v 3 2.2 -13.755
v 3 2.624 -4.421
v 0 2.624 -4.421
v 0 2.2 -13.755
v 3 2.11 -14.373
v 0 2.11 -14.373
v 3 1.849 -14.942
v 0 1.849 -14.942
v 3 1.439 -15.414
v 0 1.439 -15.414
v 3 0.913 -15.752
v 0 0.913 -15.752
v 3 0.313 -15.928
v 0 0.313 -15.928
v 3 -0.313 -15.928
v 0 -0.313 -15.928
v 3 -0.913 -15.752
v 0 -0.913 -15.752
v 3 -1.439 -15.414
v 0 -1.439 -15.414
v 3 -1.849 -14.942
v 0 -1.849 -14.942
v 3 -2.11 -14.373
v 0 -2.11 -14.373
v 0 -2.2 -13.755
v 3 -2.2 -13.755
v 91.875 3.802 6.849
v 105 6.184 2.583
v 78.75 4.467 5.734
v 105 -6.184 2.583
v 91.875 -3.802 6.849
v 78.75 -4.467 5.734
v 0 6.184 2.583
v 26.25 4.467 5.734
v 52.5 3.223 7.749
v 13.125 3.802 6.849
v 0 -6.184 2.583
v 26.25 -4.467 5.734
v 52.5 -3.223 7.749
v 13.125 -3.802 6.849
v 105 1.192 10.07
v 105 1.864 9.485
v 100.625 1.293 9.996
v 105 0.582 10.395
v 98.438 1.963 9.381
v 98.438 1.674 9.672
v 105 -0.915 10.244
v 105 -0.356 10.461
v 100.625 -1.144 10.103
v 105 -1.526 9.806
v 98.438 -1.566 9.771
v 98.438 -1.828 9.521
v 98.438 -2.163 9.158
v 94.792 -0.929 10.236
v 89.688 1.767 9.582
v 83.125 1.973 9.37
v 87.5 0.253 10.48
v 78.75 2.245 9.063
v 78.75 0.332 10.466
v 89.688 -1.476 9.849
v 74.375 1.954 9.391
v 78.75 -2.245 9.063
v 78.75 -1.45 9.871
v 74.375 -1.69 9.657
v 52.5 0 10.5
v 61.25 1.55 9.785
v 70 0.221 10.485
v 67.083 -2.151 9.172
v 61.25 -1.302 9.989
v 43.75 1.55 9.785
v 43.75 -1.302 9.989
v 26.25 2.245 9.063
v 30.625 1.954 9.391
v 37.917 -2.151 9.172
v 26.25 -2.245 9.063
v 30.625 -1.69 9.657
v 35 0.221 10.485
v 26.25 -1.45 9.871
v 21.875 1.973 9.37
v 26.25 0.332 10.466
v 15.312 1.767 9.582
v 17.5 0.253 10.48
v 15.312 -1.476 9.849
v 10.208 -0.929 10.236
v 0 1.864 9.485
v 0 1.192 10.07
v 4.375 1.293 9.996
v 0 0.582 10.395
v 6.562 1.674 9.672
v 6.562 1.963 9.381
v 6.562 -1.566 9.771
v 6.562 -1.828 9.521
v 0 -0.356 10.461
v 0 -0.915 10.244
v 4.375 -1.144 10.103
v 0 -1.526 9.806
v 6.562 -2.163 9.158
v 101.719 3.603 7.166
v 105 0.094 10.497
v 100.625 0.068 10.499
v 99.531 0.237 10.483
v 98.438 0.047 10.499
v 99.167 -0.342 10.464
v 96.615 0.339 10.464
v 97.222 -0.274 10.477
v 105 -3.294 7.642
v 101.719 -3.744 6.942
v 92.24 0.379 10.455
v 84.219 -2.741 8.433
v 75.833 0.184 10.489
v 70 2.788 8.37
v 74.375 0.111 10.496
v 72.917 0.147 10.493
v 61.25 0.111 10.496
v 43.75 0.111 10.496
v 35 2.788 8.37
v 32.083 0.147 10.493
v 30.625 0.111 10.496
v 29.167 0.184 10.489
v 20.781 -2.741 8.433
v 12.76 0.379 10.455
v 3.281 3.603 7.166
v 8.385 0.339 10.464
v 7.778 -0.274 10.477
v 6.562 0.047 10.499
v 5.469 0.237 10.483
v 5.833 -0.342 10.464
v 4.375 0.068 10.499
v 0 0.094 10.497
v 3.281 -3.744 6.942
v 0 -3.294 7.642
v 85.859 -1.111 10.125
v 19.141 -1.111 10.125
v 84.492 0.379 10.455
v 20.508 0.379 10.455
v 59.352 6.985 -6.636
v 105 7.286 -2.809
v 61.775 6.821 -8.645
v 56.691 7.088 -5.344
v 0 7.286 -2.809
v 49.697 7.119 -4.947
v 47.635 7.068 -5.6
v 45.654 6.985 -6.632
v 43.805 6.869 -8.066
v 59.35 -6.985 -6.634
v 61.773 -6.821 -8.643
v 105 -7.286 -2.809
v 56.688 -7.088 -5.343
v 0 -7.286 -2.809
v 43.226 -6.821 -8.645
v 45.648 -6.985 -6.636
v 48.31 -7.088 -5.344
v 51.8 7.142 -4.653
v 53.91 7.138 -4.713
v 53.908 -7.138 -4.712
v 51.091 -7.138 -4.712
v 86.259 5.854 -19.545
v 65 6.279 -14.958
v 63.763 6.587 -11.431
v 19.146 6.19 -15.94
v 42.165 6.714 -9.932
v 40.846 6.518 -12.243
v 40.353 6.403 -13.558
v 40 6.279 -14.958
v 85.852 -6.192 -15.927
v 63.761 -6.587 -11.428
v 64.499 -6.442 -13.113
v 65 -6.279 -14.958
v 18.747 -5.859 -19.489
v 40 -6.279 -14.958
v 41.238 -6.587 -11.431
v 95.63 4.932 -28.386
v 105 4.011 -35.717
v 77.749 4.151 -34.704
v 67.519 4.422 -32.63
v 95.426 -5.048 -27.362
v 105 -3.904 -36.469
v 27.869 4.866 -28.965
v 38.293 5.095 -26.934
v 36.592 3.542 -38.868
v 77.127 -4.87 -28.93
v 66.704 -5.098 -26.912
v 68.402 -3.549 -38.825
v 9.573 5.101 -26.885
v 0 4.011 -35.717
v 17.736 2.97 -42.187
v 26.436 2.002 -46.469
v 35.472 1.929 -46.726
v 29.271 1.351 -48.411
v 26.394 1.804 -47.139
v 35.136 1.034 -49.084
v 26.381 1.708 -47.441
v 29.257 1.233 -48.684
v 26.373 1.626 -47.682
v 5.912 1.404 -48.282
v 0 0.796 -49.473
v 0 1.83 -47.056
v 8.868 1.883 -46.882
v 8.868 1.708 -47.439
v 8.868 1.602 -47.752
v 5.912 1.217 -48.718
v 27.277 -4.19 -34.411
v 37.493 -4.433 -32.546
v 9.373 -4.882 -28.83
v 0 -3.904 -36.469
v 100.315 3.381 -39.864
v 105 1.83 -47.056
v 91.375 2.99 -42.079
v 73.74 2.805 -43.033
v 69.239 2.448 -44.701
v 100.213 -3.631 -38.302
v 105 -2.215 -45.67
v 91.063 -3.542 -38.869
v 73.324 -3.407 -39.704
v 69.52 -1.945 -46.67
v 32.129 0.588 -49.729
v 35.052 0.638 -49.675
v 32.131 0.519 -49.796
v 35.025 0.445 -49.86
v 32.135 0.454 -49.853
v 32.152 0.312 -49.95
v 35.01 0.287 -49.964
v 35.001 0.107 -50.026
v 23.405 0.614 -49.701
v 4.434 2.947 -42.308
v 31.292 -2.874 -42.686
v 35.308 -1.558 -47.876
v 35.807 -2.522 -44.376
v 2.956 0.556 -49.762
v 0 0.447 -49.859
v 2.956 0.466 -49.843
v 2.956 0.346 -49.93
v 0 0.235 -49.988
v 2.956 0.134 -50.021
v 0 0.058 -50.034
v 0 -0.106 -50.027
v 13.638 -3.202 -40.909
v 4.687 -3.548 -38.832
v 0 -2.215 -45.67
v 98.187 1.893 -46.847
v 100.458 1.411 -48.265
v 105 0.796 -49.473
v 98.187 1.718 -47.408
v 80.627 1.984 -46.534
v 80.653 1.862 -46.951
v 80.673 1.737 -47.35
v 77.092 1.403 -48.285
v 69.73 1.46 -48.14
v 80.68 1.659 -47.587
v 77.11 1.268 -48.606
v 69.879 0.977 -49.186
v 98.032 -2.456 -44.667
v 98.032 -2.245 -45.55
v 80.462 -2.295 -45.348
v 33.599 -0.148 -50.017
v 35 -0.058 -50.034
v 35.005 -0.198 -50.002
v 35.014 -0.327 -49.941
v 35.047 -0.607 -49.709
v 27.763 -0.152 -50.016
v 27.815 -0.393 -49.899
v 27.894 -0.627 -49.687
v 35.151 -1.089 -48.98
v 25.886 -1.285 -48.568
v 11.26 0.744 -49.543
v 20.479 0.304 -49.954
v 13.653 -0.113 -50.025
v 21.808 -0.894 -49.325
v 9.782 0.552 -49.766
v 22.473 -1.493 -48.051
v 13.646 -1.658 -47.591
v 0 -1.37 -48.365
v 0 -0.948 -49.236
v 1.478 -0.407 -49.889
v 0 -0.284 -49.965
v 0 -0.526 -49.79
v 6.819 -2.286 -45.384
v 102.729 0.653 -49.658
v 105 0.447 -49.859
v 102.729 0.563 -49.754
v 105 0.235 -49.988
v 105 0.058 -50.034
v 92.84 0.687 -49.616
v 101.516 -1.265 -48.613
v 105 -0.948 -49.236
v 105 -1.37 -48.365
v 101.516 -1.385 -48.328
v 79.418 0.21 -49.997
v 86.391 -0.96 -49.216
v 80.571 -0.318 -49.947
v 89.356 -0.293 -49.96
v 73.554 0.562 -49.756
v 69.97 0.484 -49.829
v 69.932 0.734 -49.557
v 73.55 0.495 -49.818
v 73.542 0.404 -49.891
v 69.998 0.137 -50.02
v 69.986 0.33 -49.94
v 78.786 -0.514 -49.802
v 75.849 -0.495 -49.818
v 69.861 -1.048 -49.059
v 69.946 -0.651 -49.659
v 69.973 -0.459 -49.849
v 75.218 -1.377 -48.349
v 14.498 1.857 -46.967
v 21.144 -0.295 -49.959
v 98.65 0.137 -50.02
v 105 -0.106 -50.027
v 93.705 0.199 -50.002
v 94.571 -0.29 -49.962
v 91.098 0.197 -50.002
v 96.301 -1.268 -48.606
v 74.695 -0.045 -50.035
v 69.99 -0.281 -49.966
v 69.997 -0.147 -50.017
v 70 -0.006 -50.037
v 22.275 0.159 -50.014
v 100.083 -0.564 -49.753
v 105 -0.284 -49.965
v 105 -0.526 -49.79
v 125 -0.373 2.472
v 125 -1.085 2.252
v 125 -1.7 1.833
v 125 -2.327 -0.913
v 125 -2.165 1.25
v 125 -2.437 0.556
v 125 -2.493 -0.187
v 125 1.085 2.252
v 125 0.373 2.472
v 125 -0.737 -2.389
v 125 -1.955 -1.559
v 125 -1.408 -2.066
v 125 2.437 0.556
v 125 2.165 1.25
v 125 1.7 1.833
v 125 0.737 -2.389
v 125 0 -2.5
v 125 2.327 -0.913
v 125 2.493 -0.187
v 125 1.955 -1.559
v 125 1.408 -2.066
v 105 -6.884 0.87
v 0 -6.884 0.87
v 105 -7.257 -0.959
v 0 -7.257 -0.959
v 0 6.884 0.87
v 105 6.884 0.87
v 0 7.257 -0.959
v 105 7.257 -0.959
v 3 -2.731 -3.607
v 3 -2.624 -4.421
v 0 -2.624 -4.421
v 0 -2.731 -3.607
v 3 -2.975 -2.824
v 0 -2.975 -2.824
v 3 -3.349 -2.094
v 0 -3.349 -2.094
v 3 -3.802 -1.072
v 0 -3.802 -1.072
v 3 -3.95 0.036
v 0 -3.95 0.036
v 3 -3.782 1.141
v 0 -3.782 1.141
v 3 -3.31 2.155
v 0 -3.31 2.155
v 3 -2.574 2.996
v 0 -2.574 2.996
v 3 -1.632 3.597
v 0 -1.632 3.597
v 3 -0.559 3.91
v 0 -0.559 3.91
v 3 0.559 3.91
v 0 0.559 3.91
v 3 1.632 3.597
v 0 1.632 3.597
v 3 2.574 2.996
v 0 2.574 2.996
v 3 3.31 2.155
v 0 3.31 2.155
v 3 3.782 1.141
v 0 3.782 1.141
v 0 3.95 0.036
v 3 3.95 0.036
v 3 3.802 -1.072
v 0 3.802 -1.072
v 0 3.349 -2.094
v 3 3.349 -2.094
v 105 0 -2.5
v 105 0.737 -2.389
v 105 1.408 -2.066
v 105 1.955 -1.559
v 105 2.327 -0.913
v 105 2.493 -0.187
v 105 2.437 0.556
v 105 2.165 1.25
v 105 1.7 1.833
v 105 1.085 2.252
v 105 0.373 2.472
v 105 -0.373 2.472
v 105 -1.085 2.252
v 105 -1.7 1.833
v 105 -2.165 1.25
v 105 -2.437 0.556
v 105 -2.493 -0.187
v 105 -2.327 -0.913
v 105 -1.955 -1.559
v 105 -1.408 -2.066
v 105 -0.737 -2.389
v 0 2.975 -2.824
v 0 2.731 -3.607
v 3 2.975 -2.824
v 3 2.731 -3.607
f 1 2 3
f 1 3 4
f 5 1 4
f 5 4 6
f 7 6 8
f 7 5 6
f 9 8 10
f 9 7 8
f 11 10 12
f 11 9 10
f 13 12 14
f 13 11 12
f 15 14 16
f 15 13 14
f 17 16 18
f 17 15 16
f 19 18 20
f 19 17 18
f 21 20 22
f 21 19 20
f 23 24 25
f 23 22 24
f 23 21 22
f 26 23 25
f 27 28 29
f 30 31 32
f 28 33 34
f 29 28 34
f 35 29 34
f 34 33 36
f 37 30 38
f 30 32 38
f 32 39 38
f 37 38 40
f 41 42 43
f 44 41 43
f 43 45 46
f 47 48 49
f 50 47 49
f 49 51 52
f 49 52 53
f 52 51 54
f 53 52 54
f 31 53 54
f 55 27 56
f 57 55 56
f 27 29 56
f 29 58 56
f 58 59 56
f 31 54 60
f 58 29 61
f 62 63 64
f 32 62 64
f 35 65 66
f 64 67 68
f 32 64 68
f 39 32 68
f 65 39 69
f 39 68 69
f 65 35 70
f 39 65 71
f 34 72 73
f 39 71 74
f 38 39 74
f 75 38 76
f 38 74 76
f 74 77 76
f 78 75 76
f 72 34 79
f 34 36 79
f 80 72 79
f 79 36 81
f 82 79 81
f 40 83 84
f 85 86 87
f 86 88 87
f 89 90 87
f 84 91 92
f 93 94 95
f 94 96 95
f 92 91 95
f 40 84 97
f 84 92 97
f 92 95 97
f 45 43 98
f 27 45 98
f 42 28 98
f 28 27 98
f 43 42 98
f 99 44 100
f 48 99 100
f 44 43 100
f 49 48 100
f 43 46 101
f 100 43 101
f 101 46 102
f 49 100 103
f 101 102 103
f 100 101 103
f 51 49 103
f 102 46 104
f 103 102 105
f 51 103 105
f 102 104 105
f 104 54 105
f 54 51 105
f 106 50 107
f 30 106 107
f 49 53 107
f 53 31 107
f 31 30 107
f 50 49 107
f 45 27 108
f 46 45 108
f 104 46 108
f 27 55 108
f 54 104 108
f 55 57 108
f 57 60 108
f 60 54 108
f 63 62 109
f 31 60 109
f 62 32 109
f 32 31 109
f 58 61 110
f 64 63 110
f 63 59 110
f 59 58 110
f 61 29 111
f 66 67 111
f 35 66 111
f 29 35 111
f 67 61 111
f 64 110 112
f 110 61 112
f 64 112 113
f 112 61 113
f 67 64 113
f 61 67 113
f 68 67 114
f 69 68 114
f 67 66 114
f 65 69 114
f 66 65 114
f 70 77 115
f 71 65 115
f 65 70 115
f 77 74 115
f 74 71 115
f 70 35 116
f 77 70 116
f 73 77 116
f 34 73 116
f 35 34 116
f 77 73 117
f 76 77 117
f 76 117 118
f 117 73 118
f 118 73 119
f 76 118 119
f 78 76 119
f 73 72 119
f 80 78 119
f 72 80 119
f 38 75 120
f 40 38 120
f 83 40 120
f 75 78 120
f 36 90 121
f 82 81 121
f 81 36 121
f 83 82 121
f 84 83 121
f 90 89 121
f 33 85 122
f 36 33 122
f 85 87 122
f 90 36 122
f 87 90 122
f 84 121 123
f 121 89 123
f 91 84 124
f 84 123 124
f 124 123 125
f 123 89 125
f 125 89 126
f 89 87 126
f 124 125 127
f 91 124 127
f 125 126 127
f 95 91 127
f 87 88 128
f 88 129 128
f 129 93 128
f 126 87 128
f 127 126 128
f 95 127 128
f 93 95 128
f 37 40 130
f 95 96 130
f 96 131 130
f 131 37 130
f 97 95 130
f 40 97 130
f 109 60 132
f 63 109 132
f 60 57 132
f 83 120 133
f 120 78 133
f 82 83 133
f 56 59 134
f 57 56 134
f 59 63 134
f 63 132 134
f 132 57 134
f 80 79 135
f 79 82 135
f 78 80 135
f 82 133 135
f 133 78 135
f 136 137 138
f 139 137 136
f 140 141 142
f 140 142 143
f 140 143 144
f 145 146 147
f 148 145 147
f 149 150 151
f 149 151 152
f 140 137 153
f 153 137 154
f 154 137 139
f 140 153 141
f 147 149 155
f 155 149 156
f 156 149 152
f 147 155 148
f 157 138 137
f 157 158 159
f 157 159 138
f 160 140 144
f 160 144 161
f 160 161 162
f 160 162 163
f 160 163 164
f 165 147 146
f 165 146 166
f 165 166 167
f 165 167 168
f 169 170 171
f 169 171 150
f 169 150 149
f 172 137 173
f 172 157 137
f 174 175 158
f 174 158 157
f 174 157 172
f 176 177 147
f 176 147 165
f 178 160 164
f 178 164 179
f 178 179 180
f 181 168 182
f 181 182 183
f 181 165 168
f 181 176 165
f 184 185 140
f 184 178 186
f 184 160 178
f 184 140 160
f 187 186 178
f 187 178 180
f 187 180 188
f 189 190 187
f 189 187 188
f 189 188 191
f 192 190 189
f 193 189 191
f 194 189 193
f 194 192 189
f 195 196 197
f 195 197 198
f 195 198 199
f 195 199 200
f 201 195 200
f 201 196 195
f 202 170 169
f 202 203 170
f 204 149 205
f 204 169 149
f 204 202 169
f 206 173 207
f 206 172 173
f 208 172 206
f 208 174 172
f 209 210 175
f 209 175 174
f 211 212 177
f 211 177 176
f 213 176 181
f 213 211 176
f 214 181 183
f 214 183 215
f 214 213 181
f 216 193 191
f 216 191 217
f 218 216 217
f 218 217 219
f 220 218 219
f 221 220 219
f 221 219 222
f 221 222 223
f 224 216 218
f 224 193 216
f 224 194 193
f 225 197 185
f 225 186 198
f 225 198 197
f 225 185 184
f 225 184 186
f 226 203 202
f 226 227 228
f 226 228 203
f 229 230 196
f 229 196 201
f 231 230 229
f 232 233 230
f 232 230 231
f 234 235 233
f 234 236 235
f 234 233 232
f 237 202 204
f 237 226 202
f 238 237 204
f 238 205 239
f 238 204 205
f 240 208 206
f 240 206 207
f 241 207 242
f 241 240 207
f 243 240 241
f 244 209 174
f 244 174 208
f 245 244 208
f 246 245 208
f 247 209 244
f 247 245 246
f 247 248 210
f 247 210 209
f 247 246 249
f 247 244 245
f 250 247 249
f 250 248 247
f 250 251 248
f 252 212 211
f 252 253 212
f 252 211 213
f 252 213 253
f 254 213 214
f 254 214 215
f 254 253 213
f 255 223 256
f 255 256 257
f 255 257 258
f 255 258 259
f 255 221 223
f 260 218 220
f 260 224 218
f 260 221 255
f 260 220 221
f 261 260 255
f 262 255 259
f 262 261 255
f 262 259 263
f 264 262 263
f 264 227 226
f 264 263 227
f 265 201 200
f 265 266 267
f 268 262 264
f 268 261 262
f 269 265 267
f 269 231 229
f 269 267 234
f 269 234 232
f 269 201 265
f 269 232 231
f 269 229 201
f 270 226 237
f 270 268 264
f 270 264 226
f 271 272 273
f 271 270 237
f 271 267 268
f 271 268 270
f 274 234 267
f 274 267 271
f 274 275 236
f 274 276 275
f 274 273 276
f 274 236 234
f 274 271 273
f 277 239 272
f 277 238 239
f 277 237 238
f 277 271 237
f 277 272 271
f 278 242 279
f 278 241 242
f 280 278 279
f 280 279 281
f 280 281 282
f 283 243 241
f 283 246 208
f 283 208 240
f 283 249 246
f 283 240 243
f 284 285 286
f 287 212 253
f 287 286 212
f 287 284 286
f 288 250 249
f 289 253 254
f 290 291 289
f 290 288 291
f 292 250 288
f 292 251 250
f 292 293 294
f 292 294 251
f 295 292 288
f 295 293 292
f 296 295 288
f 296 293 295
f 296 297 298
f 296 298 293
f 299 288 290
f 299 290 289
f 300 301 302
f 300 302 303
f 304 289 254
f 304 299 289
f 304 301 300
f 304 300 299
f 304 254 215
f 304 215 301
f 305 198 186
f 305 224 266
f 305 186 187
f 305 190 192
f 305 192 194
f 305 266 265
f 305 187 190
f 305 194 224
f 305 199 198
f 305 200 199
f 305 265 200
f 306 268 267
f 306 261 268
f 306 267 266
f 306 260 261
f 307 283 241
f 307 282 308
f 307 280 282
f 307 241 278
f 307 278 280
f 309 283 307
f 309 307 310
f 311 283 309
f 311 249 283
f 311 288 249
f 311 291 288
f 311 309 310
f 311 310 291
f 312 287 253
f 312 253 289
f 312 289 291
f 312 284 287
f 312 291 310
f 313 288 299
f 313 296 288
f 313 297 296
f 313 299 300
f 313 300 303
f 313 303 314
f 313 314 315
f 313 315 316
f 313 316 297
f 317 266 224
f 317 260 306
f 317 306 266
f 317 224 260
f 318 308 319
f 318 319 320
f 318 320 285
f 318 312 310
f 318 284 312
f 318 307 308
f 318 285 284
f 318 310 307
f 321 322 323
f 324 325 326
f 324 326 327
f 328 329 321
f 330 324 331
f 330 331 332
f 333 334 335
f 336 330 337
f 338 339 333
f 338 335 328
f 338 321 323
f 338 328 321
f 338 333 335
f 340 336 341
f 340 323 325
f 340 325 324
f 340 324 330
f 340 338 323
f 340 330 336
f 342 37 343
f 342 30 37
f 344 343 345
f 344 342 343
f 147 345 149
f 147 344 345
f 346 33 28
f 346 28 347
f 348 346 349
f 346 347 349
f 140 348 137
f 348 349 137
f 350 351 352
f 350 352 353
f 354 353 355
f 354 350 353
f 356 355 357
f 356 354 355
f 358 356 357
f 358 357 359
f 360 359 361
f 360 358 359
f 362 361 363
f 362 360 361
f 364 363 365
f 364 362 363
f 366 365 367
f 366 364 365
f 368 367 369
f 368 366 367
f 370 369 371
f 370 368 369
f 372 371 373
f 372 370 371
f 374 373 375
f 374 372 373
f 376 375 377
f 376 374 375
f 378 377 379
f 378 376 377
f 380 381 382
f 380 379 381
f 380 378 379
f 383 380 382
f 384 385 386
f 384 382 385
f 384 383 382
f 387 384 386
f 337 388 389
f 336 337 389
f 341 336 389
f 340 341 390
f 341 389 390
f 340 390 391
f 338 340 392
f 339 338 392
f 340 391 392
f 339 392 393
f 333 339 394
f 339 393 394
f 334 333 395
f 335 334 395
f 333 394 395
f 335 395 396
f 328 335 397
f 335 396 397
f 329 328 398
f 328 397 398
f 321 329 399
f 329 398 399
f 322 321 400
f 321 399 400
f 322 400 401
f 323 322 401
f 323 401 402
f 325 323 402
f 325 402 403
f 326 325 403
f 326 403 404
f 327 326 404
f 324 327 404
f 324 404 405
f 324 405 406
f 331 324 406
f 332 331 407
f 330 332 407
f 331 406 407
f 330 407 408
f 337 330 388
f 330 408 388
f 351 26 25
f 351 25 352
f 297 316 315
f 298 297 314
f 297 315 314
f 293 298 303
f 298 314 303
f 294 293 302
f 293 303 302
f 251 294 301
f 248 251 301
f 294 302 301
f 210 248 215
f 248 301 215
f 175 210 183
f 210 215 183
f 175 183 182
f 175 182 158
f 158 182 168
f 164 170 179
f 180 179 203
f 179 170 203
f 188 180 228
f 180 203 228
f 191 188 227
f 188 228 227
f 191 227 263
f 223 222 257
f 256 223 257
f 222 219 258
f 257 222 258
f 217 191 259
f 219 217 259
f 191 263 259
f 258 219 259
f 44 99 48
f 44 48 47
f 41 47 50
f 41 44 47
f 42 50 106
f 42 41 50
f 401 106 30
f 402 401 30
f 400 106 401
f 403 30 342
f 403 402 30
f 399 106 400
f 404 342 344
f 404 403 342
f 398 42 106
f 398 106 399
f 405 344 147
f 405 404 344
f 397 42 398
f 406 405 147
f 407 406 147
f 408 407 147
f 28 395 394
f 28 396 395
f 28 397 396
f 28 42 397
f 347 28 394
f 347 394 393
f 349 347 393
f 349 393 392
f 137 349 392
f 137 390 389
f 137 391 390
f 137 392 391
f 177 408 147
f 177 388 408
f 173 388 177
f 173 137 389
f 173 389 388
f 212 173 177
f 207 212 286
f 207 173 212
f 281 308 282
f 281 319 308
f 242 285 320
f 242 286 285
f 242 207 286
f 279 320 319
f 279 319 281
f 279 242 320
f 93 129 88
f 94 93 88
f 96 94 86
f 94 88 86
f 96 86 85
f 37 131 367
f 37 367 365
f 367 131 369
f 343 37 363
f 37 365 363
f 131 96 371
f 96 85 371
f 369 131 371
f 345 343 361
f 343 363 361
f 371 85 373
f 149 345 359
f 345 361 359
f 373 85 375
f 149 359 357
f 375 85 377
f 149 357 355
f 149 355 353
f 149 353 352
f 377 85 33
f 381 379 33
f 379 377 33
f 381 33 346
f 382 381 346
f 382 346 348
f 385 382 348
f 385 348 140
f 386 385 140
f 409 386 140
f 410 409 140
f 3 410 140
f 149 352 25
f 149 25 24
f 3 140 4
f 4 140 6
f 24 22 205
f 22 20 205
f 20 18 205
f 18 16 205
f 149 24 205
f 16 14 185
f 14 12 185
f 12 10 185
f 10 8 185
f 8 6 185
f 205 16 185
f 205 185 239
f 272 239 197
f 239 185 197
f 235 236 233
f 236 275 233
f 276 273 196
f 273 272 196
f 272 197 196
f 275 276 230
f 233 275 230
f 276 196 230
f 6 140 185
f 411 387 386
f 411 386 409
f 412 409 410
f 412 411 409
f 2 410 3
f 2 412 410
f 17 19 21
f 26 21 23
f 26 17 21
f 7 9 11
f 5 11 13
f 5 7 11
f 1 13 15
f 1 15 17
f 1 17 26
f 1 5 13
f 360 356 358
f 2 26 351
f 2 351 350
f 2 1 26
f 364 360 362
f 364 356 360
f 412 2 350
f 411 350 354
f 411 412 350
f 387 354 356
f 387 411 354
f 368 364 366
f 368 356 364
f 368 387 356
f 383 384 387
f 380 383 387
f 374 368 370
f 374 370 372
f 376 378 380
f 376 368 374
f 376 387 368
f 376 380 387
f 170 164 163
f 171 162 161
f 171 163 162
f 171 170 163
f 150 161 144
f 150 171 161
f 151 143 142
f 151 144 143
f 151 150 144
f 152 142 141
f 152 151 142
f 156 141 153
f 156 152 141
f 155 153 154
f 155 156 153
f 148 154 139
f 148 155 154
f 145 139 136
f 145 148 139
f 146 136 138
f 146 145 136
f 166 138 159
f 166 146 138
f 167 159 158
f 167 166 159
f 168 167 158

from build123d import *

# Parameters (mm, degrees)
SKETCH1_R               = 1.5
BOSS_EXTRUDE1_DEPTH     = 105
FILLET1_R               = 10
CUT_EXTRUDE1_DEPTH      = 117.542660484
CUT_EXTRUDE1_DEPTH_BACK = 117.542660484
CAVITY1_DEPTH           = 3
SKETCH3_R               = 2.5
SKETCH3_R_2             = 1.5
BOSS_EXTRUDE2_DEPTH     = 20
BOSS_EXTRUDE3_REACH     = 134.065
SKETCH4_R               = 1.5
CUT_EXTRUDE2_DEPTH      = 135.841357497
CUT_EXTRUDE2_DEPTH_BACK = 135.841357497
FILLET2_R               = 5
CUT_EXTRUDE3_DEPTH      = 10


# Read off the part's stored shape, not the designer's step: Cavity1
with BuildPart() as part:
    # Sketch1 → Boss-Extrude1 (new body)
    with BuildSketch(Plane(origin=(0, 0, 0), x_dir=(0, 0, -1), z_dir=(1, 0, 0))):
        with BuildLine():
            add(Edge.make_bspline(
                [(3.73e-07, 7.5), (-15, 0), (-3.73e-07, -7.5)],
                knots=[0, 0, 0, 1, 1, 1], degree=2, weights=[1, 2.333333333, 1]))
            add(Edge.make_bspline(
                [(3.73e-07, 7.5), (100, 0), (-3.73e-07, -7.5)],
                knots=[0, 0, 0, 1, 1, 1], degree=2, weights=[1, 1.001467765, 1]))
        make_face()
        Circle(SKETCH1_R, mode=Mode.SUBTRACT)
    extrude(amount=BOSS_EXTRUDE1_DEPTH)

    # Fillet1
    fillet1_edges = [part.edges().sort_by_distance(p)[0] for p in [
        (52.5, -7.5, 3.73e-07),
        (52.5, 7.5, -3.73e-07),
    ]]
    fillet(fillet1_edges, radius=FILLET1_R)

    # Sketch2 → Cut-Extrude1 (cut, two sides: drawn at the far end of the back side and taken through both)
    with BuildSketch(Plane(origin=(0, 0, 0), x_dir=(1, 0, 0), z_dir=(0, 1, 0)).offset(-CUT_EXTRUDE1_DEPTH_BACK)):
        with BuildLine():
            Line((65, 19.76833361), (65, 24.578179161))
            ThreePointArc((65, 24.578179161), (52.5, 34.902500415), (40, 24.578179161))
            Line((40, 24.578179161), (40, 19.76833361))
            Line((40, 19.76833361), (40, 14.958488059))
            ThreePointArc((40, 14.958488059), (52.5, 4.634166805), (65, 14.958488059))
            Line((65, 14.958488059), (65, 19.76833361))
        make_face()
        with BuildLine():
            Line((65, 24.578179161), (65, 50.03666722))
            Line((65, 50.03666722), (40, 50.03666722))
            Line((40, 50.03666722), (40, 24.578179161))
            ThreePointArc((40, 24.578179161), (52.5, 34.902500415), (65, 24.578179161))
        make_face()
    extrude(amount=CUT_EXTRUDE1_DEPTH + CUT_EXTRUDE1_DEPTH_BACK, mode=Mode.SUBTRACT)

    # Cavity1 outline → Cavity1 (cut)
    with BuildSketch(Plane.YZ):
        with BuildLine():
            ThreePointArc((-2, -13.75), (0, -15.75), (2, -13.75))
            Line((2, -13.75), (2.497863905, -2.796994085))
            ThreePointArc((2.497863905, -2.796994085), (0, 3.75), (-2.497863905, -2.796994085))
            Line((-2.497863905, -2.796994085), (-2, -13.75))
        make_face()
    extrude(amount=CAVITY1_DEPTH, mode=Mode.SUBTRACT)

    # Sketch3 → Boss-Extrude2 (add)
    # profile 1 of 2: a face of its own
    with BuildSketch(Plane(origin=(105, 0, 0), x_dir=(0, 0, -1), z_dir=(1, 0, 0))):
        Circle(SKETCH3_R)
        with Locations(Location((0, 0, 0), (0, 0, 180))):
            Circle(SKETCH3_R_2, mode=Mode.SUBTRACT)
    # profile 2 of 2: a face of its own
    with BuildSketch(Plane(origin=(105, 0, 0), x_dir=(0, 0, -1), z_dir=(1, 0, 0))):
        with Locations(Location((0, 0, 0), (0, 0, 180))):
            Circle(SKETCH3_R_2)
    extrude(amount=BOSS_EXTRUDE2_DEPTH)

    # Sketch4 → Boss-Extrude3 (add, up to next)
    with BuildSketch(Plane.ZY.offset(-3), mode=Mode.PRIVATE) as boss_extrude3_sk1:
        Circle(SKETCH4_R)
    boss_extrude3_tool1 = extrude(boss_extrude3_sk1.sketch, amount=-BOSS_EXTRUDE3_REACH, mode=Mode.PRIVATE) - part.part
    add(boss_extrude3_tool1.solids().sort_by_distance((3, 0, 0))[0])

    # Sketch5 → Cut-Extrude2 (cut, two sides: drawn at the far end of the back side and taken through both)
    with BuildSketch(Plane(origin=(0, 0, 0), x_dir=(1, 0, 0), z_dir=(0, 1, 0)).offset(-CUT_EXTRUDE2_DEPTH_BACK)):
        Polygon((40, 14.958488059), (35, 50.03666722), (40, 50.03666722), align=None)
        Polygon((65, 50.03666722), (70, 50.03666722), (65, 14.958488059), align=None)
    extrude(amount=CUT_EXTRUDE2_DEPTH + CUT_EXTRUDE2_DEPTH_BACK, mode=Mode.SUBTRACT)

    # Fillet2
    fillet2_edges = [part.edges().sort_by_distance(p)[0] for p in [
        (1.5, 2.497863905, -2.796994085),
        (1.5, -2.497863905, -2.796994085),
    ]]
    fillet(fillet2_edges, radius=FILLET2_R)

    # Sketch7 → Cut-Extrude3 (cut)
    with BuildSketch(Plane.ZY.offset(-3)):
        with BuildLine():
            Line((-13.754651281, -2.199995083), (-4.420599378, -2.62427017))
            ThreePointArc((-4.420599378, -2.62427017), (-3.210509972, -2.836668826), (-2.093976777, -3.349292651))
            ThreePointArc((-2.093976777, -3.349292651), (3.95, 0), (-2.093976777, 3.349292651))
            ThreePointArc((-2.093976777, 3.349292651), (-3.210509972, 2.836668826), (-4.420599378, 2.62427017))
            Line((-4.420599378, 2.62427017), (-13.754651281, 2.199995083))
            ThreePointArc((-13.754651281, 2.199995083), (-15.95, 0), (-13.754651281, -2.199995083))
        make_face()
        with BuildLine():
            Line((-4.411517846, 2.424476462), (-13.75, 2))
            ThreePointArc((-13.75, 2), (-15.75, 0), (-13.75, -2))
            Line((-13.75, -2), (-4.411517846, -2.424476462))
            ThreePointArc((-4.411517846, -2.424476462), (-3.151008047, -2.645725062), (-1.987952636, -3.179708213))
            ThreePointArc((-1.987952636, -3.179708213), (3.75, 0), (-1.987952636, 3.179708213))
            ThreePointArc((-1.987952636, 3.179708213), (-3.151008047, 2.645725062), (-4.411517846, 2.424476462))
        make_face(mode=Mode.SUBTRACT)
    extrude(amount=CUT_EXTRUDE3_DEPTH, mode=Mode.SUBTRACT)


solid = part.part
